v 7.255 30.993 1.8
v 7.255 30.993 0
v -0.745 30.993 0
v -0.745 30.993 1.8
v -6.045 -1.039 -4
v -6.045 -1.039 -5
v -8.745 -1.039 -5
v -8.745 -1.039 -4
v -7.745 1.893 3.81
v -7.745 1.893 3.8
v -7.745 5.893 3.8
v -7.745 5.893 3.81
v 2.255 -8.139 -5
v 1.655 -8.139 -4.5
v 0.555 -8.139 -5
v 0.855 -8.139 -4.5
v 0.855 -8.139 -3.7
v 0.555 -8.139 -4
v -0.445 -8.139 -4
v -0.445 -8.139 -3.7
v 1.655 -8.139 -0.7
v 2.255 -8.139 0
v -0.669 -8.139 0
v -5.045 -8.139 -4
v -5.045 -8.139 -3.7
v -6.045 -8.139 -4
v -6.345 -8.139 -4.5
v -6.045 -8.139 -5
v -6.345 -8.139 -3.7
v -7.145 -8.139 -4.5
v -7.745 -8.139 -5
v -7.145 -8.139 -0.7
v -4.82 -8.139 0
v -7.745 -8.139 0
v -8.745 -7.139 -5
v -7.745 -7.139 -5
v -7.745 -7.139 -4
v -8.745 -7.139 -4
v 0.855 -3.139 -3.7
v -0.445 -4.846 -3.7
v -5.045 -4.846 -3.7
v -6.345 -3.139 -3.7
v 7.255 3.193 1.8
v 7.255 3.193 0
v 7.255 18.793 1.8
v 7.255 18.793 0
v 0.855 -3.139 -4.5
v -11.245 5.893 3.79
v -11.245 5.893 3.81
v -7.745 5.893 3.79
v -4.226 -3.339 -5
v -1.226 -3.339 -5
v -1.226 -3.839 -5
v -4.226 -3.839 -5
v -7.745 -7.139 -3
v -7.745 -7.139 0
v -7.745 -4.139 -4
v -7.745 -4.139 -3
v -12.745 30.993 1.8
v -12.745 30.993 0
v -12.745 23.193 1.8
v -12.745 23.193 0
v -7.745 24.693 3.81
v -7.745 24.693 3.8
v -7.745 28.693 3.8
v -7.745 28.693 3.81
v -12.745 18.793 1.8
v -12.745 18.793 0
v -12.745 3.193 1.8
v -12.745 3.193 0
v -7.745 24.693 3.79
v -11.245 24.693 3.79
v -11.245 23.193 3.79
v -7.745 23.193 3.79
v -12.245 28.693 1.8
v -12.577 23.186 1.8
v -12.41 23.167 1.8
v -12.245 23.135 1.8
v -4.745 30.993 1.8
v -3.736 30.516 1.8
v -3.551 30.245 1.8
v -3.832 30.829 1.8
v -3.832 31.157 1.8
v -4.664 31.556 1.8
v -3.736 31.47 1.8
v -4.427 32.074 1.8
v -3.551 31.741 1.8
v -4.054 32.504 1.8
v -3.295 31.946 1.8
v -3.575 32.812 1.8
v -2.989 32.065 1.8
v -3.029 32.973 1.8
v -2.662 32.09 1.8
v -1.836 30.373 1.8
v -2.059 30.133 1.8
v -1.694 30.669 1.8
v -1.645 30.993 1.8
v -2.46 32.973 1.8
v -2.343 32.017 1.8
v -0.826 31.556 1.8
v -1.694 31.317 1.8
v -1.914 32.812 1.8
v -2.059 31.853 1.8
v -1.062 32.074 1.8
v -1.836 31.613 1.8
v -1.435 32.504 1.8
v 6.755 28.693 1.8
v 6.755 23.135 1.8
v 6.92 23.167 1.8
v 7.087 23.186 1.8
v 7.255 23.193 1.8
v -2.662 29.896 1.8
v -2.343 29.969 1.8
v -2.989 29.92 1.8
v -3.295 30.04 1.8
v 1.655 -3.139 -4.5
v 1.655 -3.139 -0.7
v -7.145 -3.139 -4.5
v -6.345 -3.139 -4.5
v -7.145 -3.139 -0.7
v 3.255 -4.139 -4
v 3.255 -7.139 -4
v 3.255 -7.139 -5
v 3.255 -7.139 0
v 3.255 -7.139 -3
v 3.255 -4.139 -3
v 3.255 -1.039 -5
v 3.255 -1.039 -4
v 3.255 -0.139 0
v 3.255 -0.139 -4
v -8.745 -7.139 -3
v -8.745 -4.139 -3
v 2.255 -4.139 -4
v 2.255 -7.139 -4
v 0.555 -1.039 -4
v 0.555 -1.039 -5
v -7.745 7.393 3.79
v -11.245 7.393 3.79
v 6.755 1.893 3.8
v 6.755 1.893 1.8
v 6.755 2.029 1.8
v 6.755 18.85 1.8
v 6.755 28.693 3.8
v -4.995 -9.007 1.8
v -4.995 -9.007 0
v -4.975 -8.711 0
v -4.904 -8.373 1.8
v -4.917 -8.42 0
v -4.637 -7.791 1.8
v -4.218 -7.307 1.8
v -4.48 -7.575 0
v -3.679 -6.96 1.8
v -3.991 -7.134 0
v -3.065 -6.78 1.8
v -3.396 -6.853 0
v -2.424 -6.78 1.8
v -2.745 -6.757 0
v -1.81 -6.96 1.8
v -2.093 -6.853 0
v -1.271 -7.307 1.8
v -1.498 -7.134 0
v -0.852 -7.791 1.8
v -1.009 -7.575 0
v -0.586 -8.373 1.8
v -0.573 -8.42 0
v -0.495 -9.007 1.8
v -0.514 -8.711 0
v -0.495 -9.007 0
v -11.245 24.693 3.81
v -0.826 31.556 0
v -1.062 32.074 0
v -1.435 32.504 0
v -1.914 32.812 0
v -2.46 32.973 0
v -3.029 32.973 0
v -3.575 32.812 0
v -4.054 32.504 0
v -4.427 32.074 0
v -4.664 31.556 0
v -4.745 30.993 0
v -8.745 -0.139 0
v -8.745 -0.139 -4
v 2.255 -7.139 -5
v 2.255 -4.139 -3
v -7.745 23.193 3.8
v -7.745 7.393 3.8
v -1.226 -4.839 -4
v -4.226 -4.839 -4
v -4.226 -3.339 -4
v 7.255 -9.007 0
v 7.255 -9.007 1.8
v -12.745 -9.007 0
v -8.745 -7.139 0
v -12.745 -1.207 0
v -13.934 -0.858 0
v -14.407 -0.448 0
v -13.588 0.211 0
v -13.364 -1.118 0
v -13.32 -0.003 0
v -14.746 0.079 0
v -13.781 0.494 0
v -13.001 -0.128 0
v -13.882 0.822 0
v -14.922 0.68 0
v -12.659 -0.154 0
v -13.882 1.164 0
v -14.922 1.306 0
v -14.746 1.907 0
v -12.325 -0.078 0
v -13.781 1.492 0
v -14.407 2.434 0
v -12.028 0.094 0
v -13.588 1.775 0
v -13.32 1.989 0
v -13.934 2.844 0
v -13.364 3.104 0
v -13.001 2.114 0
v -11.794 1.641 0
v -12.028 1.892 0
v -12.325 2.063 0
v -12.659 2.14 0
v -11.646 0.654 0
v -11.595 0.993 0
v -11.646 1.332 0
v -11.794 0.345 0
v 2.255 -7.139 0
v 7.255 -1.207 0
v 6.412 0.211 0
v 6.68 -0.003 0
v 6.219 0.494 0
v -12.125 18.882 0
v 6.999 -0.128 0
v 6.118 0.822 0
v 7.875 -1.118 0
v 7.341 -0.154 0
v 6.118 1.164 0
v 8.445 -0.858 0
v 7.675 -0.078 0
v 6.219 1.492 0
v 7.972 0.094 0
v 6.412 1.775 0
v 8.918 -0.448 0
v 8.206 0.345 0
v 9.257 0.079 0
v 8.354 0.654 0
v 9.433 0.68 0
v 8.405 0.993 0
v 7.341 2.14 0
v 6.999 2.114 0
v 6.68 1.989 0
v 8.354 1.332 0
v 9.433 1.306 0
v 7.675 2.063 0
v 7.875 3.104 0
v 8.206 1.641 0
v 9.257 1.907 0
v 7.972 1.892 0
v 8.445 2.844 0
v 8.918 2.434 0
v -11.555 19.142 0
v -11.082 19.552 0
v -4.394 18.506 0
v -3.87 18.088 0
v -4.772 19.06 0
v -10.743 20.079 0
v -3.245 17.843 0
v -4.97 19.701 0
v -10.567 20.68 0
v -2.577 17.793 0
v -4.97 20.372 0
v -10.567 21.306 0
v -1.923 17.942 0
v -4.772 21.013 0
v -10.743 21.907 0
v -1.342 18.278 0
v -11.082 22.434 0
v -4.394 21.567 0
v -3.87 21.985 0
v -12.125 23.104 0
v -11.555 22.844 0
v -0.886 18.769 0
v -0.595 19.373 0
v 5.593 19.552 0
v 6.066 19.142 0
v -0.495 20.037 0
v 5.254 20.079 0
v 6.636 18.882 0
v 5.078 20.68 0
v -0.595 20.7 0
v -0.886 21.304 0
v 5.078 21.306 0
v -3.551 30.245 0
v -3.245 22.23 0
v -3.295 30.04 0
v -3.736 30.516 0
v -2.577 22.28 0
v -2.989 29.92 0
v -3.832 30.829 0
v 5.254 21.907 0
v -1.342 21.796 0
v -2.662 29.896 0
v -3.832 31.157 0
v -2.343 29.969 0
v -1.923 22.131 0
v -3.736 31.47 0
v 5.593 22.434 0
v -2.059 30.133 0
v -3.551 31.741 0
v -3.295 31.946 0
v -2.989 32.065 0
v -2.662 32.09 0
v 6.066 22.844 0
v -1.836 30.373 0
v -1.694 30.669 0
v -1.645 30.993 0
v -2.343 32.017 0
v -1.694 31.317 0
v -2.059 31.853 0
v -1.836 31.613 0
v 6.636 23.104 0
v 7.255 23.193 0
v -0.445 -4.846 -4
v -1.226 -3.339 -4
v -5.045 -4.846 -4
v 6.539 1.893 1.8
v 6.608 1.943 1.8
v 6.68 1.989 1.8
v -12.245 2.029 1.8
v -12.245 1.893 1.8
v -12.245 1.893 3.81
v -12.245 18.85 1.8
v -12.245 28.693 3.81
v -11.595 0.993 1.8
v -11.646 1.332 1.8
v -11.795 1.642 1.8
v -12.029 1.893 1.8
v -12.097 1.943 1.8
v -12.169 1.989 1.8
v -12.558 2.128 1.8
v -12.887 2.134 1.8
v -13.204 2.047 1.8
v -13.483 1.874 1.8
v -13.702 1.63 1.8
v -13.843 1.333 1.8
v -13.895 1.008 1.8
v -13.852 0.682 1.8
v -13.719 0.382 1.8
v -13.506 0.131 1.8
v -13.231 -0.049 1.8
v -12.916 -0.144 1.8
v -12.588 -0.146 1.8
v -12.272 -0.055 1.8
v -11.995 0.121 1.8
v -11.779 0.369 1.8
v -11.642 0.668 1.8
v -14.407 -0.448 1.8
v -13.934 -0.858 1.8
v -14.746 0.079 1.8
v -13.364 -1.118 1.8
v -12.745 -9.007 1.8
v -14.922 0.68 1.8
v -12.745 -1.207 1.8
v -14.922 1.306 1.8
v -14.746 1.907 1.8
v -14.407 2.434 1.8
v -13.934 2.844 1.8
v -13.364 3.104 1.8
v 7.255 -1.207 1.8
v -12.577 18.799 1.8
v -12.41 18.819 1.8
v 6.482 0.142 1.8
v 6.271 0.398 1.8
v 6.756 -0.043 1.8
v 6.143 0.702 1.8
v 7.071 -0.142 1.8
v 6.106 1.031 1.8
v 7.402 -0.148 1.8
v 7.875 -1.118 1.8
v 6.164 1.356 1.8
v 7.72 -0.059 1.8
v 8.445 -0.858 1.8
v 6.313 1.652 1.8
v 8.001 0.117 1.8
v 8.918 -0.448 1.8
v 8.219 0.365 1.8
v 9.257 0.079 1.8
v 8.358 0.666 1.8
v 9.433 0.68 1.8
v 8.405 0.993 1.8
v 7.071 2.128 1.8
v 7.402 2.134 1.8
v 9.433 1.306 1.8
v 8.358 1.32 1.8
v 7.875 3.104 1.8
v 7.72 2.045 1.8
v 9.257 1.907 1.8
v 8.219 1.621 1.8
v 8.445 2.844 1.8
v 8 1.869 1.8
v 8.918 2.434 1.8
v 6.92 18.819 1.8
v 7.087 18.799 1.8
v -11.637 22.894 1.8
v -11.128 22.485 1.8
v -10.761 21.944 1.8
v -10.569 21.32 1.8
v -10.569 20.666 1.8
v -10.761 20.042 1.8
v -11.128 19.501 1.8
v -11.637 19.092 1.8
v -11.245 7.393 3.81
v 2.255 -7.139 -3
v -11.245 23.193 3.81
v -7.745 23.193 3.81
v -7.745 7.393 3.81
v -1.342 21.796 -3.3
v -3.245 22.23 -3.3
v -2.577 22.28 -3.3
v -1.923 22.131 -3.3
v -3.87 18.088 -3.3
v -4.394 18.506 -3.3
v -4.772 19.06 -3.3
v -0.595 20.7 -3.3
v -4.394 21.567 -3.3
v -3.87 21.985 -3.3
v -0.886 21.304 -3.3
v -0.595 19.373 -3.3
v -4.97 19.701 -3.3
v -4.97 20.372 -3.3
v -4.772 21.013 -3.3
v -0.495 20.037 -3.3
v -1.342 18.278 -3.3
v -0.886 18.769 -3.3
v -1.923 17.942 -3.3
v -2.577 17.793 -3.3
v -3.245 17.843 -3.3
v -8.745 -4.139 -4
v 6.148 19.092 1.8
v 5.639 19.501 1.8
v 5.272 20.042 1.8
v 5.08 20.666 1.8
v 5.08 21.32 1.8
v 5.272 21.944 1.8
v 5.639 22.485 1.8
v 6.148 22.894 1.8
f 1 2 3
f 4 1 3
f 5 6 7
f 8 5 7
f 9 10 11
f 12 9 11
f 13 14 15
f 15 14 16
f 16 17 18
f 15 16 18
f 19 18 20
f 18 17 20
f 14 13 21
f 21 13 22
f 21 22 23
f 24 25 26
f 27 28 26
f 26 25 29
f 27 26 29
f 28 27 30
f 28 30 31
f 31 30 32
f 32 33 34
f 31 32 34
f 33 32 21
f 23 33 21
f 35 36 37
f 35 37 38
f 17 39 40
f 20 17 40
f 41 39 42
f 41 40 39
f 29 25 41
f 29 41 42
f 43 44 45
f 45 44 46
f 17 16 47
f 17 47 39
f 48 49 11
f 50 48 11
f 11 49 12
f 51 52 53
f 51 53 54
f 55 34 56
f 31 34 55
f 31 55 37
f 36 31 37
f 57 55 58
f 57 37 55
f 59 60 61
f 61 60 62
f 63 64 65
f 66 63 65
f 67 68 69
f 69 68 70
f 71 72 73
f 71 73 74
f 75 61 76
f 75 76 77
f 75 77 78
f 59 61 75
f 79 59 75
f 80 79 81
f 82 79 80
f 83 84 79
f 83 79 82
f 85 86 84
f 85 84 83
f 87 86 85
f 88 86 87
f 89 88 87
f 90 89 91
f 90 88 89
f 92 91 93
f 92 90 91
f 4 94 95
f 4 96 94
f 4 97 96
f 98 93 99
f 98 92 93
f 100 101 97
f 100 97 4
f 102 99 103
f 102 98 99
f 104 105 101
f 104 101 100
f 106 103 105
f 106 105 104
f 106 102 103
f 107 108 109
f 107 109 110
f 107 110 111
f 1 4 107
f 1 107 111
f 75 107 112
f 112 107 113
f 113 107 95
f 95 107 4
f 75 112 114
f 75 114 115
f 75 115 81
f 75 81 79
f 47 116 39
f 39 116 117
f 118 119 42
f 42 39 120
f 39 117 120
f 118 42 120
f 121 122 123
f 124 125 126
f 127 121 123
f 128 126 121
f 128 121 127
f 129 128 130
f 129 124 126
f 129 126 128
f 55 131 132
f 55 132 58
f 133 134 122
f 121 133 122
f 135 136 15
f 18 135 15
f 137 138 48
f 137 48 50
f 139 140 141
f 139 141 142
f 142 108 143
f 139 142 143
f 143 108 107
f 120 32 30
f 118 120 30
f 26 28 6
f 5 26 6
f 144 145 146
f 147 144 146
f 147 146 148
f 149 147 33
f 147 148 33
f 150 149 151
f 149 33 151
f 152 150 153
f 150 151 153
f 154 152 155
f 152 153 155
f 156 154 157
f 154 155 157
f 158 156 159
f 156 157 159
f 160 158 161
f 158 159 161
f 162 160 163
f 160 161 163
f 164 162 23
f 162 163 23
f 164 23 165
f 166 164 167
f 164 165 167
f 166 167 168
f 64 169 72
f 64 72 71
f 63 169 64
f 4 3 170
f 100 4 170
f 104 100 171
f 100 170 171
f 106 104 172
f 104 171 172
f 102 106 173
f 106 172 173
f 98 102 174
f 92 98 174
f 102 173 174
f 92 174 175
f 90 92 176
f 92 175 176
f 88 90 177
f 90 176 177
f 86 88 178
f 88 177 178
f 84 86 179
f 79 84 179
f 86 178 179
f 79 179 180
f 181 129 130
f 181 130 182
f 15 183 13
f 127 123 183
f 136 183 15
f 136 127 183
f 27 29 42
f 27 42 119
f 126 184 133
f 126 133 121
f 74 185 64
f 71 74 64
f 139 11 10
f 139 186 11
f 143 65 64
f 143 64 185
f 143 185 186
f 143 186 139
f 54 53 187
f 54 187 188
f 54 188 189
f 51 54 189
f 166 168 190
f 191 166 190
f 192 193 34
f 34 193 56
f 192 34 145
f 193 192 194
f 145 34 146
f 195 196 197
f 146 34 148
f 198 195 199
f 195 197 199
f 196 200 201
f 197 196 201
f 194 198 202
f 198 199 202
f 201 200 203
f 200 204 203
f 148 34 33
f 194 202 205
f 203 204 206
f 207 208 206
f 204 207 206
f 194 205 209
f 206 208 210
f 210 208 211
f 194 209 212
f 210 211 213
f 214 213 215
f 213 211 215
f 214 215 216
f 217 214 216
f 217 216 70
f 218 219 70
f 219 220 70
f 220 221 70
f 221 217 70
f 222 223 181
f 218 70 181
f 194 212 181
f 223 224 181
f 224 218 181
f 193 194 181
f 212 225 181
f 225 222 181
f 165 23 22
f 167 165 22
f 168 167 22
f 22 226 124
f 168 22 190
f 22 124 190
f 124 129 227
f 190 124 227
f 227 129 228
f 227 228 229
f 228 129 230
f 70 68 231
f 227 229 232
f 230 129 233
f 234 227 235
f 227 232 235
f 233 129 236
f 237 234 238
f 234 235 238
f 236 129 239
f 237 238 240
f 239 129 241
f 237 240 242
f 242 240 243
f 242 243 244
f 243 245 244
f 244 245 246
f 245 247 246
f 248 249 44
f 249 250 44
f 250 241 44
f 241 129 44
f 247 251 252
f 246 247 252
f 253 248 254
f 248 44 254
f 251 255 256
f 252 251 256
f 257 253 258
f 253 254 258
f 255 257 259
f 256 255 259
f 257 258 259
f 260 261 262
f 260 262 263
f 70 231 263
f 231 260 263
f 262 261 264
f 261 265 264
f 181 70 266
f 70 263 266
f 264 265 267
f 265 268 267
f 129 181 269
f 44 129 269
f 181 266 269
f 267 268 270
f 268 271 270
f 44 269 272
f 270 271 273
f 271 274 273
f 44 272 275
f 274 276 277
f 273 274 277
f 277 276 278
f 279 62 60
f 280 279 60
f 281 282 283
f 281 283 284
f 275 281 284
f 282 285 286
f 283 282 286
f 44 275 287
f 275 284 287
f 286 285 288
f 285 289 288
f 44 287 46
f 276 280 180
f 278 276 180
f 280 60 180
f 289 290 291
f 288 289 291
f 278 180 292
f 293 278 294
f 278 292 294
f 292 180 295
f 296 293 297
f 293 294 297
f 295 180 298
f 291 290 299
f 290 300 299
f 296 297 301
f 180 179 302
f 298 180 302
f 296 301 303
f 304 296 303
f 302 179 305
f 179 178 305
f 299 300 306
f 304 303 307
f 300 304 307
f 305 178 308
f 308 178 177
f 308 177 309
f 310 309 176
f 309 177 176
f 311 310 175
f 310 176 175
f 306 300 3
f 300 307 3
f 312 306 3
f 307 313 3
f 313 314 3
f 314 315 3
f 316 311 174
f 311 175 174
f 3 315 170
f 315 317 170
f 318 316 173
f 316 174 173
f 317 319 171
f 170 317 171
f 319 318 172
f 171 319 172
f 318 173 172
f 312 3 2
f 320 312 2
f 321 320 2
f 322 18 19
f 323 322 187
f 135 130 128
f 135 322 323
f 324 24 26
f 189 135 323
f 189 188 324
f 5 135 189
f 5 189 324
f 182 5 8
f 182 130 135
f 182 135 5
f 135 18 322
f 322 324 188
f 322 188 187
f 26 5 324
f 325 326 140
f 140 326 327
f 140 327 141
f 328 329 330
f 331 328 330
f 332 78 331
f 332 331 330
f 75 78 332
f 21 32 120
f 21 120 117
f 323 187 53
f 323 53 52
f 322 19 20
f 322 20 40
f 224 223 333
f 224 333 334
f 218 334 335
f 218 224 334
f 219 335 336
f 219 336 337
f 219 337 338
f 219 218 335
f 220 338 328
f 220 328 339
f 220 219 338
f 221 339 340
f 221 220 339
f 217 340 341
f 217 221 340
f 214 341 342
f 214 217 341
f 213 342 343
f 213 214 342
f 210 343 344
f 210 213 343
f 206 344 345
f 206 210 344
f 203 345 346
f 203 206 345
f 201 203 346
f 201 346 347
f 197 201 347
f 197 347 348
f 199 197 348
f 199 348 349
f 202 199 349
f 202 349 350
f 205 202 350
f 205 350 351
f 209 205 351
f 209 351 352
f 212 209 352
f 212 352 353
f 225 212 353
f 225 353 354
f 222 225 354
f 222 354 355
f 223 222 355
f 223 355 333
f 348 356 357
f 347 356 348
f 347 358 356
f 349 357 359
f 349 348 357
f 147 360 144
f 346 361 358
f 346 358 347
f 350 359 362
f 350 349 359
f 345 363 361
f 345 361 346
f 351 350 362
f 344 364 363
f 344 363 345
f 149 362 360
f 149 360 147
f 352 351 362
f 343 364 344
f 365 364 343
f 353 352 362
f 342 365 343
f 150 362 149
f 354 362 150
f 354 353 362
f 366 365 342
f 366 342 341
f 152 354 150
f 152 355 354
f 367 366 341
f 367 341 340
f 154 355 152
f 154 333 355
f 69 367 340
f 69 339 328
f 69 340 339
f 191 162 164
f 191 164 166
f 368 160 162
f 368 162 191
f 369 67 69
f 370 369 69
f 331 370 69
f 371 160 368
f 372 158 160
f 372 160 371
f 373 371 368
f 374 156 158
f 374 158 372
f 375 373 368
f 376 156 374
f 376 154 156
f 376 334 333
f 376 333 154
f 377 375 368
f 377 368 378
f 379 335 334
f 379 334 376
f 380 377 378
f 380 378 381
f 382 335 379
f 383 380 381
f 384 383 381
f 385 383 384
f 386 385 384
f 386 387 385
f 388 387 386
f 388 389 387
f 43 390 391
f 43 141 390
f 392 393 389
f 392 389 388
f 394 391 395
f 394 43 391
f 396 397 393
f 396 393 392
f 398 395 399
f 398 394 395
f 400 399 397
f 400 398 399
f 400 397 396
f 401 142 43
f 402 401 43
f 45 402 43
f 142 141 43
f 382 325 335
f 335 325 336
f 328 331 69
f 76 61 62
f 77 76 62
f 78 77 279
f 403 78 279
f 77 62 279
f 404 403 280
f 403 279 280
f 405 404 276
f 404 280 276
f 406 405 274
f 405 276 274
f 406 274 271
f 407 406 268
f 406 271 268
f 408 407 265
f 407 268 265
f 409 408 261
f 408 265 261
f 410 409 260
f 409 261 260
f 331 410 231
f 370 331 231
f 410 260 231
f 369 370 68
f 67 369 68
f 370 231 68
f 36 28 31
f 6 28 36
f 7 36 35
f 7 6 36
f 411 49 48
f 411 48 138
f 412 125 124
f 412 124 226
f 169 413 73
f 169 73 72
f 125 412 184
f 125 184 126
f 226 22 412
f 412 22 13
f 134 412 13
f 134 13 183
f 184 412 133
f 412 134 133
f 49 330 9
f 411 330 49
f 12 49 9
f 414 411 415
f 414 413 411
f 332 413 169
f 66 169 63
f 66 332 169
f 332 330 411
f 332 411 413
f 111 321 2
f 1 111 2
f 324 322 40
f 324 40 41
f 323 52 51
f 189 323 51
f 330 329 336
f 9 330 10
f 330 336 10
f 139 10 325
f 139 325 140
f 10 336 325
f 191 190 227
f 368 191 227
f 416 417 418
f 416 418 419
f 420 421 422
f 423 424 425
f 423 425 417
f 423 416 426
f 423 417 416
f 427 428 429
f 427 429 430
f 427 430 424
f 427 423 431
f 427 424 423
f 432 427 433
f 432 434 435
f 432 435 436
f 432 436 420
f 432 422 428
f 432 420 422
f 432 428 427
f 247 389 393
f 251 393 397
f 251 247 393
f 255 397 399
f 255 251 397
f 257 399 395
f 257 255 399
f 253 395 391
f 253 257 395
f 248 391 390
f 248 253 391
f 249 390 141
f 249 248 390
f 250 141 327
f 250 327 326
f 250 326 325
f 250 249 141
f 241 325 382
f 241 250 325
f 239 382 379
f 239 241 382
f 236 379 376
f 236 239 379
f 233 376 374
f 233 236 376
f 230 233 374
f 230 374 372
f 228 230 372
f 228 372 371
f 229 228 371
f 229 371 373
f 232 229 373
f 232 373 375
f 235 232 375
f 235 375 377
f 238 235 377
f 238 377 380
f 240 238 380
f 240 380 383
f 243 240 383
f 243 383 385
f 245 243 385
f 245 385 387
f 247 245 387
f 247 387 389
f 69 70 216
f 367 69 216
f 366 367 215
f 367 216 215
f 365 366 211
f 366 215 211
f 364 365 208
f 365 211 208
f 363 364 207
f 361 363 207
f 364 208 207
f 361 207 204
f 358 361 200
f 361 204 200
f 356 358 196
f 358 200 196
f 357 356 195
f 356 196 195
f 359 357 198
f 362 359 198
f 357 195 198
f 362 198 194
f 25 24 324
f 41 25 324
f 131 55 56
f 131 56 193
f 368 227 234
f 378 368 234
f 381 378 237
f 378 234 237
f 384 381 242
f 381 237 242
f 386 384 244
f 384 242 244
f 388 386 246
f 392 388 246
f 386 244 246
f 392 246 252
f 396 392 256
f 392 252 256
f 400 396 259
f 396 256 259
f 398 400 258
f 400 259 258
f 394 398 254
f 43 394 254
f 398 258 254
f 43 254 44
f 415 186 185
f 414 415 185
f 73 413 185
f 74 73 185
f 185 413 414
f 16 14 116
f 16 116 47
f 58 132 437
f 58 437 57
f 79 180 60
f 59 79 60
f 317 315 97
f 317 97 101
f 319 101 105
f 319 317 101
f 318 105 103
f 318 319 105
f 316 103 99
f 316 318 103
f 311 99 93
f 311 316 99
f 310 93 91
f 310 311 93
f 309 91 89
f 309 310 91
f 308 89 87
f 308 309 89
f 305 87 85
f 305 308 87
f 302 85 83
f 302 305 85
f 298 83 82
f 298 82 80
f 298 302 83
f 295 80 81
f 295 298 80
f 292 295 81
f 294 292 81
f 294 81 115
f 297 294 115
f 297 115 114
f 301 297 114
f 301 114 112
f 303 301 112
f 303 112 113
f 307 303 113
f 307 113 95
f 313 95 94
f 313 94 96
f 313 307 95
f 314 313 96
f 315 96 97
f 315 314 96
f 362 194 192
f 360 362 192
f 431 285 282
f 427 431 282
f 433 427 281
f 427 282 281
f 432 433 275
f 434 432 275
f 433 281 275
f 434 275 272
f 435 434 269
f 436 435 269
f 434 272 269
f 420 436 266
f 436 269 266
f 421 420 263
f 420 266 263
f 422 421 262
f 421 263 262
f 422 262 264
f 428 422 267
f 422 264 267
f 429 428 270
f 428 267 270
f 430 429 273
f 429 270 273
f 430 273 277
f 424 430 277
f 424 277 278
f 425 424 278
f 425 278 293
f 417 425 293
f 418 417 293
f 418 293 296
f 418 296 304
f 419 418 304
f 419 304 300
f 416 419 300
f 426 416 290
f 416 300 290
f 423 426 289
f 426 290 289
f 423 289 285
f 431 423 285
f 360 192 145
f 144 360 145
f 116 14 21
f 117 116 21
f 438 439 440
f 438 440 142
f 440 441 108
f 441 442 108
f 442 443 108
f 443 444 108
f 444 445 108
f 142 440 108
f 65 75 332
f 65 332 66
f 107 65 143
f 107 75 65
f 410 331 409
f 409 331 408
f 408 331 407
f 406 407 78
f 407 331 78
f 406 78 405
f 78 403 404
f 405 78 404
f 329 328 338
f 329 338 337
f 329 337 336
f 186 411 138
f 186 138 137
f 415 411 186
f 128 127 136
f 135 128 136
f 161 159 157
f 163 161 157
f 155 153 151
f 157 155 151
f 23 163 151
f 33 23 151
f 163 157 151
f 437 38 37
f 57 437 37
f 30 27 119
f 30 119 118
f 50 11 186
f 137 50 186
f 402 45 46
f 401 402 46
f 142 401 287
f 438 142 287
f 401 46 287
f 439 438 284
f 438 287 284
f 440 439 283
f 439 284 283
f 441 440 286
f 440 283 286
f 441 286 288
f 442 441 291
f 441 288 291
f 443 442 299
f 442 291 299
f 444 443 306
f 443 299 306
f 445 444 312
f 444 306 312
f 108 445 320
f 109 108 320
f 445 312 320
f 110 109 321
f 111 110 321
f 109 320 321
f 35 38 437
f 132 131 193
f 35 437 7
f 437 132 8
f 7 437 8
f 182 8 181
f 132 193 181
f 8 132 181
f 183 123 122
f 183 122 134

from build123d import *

# Parameters (mm, degrees)
ESQUISSE1_R             = 1.15
ESQUISSE1_R_2           = 1.1
BOSS_EXTRU_1_DEPTH      = 1.8
ESQUISSE2_W             = 19
ESQUISSE2_H             = 26.8
BOSS_EXTRU_2_DEPTH      = 2
ESQUISSE3_W             = 4.5
ESQUISSE3_H             = 26.8
BOSS_EXTRU_3_DEPTH      = 0.01
ESQUISSE4_W             = 3.5
ESQUISSE4_H             = 1.5
ENL_V_MAT_EXTRU_1_DEPTH = 0.02
ESQUISSE5_W             = 12
ESQUISSE5_H             = 8
BOSS_EXTRU_4_DEPTH      = 5
ESQUISSE6_W             = 3
ESQUISSE6_H             = 1.5
ENL_V_MAT_EXTRU_2_DEPTH = 1
ESQUISSE8_W             = 4.6
ESQUISSE8_H             = 3.292306134
ENL_V_MAT_EXTRU_3_DEPTH = 1
CHANFREIN1_SIZE         = 1
ENL_V_MAT_EXTRU_4_DEPTH = 5
ESQUISSE10_W            = 1
ESQUISSE10_H            = 1
ENL_V_MAT_EXTRU_5_DEPTH = 4
ESQUISSE11_W            = 1
ESQUISSE11_H            = 1
ENL_V_MAT_EXTRU_7_DEPTH = 5
ESQUISSE12_R            = 2.25
BOSS_EXTRU_5_DEPTH      = 3.3


with BuildPart() as part:
    # Esquisse1 → Boss.-Extru.1 (new body)
    with BuildSketch(Plane.XY):
        with BuildLine():
            Line((-12.744645331, 10.992907801), (-12.744645331, 3.192907801))
            ThreePointArc((-12.744645331, 3.192907801), (-14.944645331, 0.992907801), (-12.744645331, -1.207092199))
            Line((-12.744645331, -1.207092199), (-12.744645331, -9.007092199))
            Line((-12.744645331, -9.007092199), (-4.994645331, -9.007092199))
            ThreePointArc((-4.994645331, -9.007092199), (-2.744645331, -6.757092199), (-0.494645331, -9.007092199))
            Line((-0.494645331, -9.007092199), (7.255354669, -9.007092199))
            Line((7.255354669, -9.007092199), (7.255354669, -1.207092199))
            ThreePointArc((7.255354669, -1.207092199), (9.455354669, 0.992907801), (7.255354669, 3.192907801))
            Line((7.255354669, 3.192907801), (7.255354669, 10.992907801))
            Line((7.255354669, 10.992907801), (7.255354669, 18.792907801))
            ThreePointArc((7.255354669, 18.792907801), (5.055354669, 20.992907801), (7.255354669, 23.192907801))
            Line((7.255354669, 23.192907801), (7.255354669, 30.992907801))
            Line((7.255354669, 30.992907801), (-0.744645331, 30.992907801))
            ThreePointArc((-0.744645331, 30.992907801), (-2.744645331, 32.992907801), (-4.744645331, 30.992907801))
            Line((-4.744645331, 30.992907801), (-12.744645331, 30.992907801))
            Line((-12.744645331, 30.992907801), (-12.744645331, 23.192907801))
            ThreePointArc((-12.744645331, 23.192907801), (-10.544645331, 20.992907801), (-12.744645331, 18.792907801))
            Line((-12.744645331, 18.792907801), (-12.744645331, 10.992907801))
        make_face()
        with Locations((-12.744645331, 0.992907801)):
            Circle(ESQUISSE1_R, mode=Mode.SUBTRACT)
        with Locations((7.255354669, 0.992907801)):
            Circle(ESQUISSE1_R, mode=Mode.SUBTRACT)
        with Locations((-2.744645331, 30.992907801)):
            Circle(ESQUISSE1_R_2, mode=Mode.SUBTRACT)
    extrude(amount=BOSS_EXTRU_1_DEPTH)

    # Esquisse2 → Boss.-Extru.2 (add)
    with BuildSketch(Plane.XY.offset(1.8)):
        with Locations((-2.744645331, 15.292907801)):
            Rectangle(ESQUISSE2_W, ESQUISSE2_H)
    extrude(amount=BOSS_EXTRU_2_DEPTH)

    # Esquisse3 → Boss.-Extru.3 (add)
    with BuildSketch(Plane.XY.offset(3.8)):
        with Locations((-9.994645331, 15.292907801)):
            Rectangle(ESQUISSE3_W, ESQUISSE3_H)
    extrude(amount=BOSS_EXTRU_3_DEPTH)

    # Esquisse4 → Enlèv. mat.-Extru.1 (cut)
    with BuildSketch(Plane.XY.offset(3.81)):
        with Locations((-9.494645331, 23.942907801)):
            Rectangle(ESQUISSE4_W, ESQUISSE4_H)
        with Locations((-9.494645331, 6.642907801)):
            Rectangle(ESQUISSE4_W, ESQUISSE4_H)
    extrude(amount=-ENL_V_MAT_EXTRU_1_DEPTH, mode=Mode.SUBTRACT)

    # Esquisse5 → Boss.-Extru.4 (add)
    with BuildSketch(Plane(origin=(0, 0, 0), x_dir=(-1, 0, 0), z_dir=(0, 0, -1))):
        with Locations((2.744645331, -4.138713158)):
            Rectangle(ESQUISSE5_W, ESQUISSE5_H)
    extrude(amount=BOSS_EXTRU_4_DEPTH)

    # Esquisse6 → Enlèv. mat.-Extru.2 (cut)
    with BuildSketch(Plane(origin=(0, 0, -5), x_dir=(-1, 0, 0), z_dir=(0, 0, -1))):
        Polygon((8.744645331, -0.138713158), (-3.255354669, -0.138713158), (-3.255354669, -1.038713158), (-0.555354669, -1.038713158), (-0.555354669, -8.138713158), (6.044645331, -8.138713158), (6.044645331, -1.038713158), (8.744645331, -1.038713158), align=None)
        with Locations((2.725727115, -4.088713158)):
            Rectangle(ESQUISSE6_W, ESQUISSE6_H, mode=Mode.SUBTRACT)
    extrude(amount=-ENL_V_MAT_EXTRU_2_DEPTH, mode=Mode.SUBTRACT)

    # Esquisse8 → Enlèv. mat.-Extru.3 (cut)
    with BuildSketch(Plane(origin=(0, 0, -4), x_dir=(-1, 0, 0), z_dir=(0, 0, -1))):
        with Locations((2.744645331, -6.492560091)):
            Rectangle(ESQUISSE8_W, ESQUISSE8_H)
    extrude(amount=-ENL_V_MAT_EXTRU_3_DEPTH, mode=Mode.SUBTRACT)

    # Chanfrein1
    chanfrein1_edges = [part.edges().sort_by_distance(p)[0] for p in [
        (-2.725727115, -4.838713158, -5),
    ]]
    chamfer(chanfrein1_edges, length=CHANFREIN1_SIZE - 0.0001)  # a hair under: the kernel refuses the full size

    # Esquisse9 → Enlèv. mat.-Extru.4 (cut)
    with BuildSketch(Plane.XZ.offset(8.138713158)):
        Polygon((-7.144645331, -0.7), (1.655354669, -0.7), (1.655354669, -3.7), (1.655354669, -4.5), (0.855354669, -4.5), (0.855354669, -3.7), (-6.344645331, -3.7), (-6.344645331, -4.5), (-7.144645331, -4.5), (-7.144645331, -3.7), align=None)
    extrude(amount=-ENL_V_MAT_EXTRU_4_DEPTH, mode=Mode.SUBTRACT)

    # Esquisse10 → Enlèv. mat.-Extru.5 (cut)
    with BuildSketch(Plane.XZ.offset(8.138713158)):
        with Locations((-8.244645331, -3.5)):
            Rectangle(ESQUISSE10_W, ESQUISSE10_H)
        with Locations((2.755354669, -3.5)):
            Rectangle(ESQUISSE10_W, ESQUISSE10_H)
    extrude(amount=-ENL_V_MAT_EXTRU_5_DEPTH, mode=Mode.SUBTRACT)

    # Esquisse11 → Enlèv. mat.-Extru.7 (cut)
    with BuildSketch(Plane(origin=(0, 0, -5), x_dir=(-1, 0, 0), z_dir=(0, 0, -1))):
        with Locations((-2.755354669, -7.638713158)):
            Rectangle(ESQUISSE11_W, ESQUISSE11_H)
        with Locations((8.244645331, -7.638713158)):
            Rectangle(ESQUISSE11_W, ESQUISSE11_H)
    extrude(amount=-ENL_V_MAT_EXTRU_7_DEPTH, mode=Mode.SUBTRACT)

    # Esquisse12 → Boss.-Extru.5 (add)
    with BuildSketch(Plane(origin=(0, 0, 0), x_dir=(-1, 0, 0), z_dir=(0, 0, -1))):
        with Locations(Location((2.744645331, 20.036668052, 0), (0, 0, 180))):
            Circle(ESQUISSE12_R)
    extrude(amount=BOSS_EXTRU_5_DEPTH)


solid = part.part
